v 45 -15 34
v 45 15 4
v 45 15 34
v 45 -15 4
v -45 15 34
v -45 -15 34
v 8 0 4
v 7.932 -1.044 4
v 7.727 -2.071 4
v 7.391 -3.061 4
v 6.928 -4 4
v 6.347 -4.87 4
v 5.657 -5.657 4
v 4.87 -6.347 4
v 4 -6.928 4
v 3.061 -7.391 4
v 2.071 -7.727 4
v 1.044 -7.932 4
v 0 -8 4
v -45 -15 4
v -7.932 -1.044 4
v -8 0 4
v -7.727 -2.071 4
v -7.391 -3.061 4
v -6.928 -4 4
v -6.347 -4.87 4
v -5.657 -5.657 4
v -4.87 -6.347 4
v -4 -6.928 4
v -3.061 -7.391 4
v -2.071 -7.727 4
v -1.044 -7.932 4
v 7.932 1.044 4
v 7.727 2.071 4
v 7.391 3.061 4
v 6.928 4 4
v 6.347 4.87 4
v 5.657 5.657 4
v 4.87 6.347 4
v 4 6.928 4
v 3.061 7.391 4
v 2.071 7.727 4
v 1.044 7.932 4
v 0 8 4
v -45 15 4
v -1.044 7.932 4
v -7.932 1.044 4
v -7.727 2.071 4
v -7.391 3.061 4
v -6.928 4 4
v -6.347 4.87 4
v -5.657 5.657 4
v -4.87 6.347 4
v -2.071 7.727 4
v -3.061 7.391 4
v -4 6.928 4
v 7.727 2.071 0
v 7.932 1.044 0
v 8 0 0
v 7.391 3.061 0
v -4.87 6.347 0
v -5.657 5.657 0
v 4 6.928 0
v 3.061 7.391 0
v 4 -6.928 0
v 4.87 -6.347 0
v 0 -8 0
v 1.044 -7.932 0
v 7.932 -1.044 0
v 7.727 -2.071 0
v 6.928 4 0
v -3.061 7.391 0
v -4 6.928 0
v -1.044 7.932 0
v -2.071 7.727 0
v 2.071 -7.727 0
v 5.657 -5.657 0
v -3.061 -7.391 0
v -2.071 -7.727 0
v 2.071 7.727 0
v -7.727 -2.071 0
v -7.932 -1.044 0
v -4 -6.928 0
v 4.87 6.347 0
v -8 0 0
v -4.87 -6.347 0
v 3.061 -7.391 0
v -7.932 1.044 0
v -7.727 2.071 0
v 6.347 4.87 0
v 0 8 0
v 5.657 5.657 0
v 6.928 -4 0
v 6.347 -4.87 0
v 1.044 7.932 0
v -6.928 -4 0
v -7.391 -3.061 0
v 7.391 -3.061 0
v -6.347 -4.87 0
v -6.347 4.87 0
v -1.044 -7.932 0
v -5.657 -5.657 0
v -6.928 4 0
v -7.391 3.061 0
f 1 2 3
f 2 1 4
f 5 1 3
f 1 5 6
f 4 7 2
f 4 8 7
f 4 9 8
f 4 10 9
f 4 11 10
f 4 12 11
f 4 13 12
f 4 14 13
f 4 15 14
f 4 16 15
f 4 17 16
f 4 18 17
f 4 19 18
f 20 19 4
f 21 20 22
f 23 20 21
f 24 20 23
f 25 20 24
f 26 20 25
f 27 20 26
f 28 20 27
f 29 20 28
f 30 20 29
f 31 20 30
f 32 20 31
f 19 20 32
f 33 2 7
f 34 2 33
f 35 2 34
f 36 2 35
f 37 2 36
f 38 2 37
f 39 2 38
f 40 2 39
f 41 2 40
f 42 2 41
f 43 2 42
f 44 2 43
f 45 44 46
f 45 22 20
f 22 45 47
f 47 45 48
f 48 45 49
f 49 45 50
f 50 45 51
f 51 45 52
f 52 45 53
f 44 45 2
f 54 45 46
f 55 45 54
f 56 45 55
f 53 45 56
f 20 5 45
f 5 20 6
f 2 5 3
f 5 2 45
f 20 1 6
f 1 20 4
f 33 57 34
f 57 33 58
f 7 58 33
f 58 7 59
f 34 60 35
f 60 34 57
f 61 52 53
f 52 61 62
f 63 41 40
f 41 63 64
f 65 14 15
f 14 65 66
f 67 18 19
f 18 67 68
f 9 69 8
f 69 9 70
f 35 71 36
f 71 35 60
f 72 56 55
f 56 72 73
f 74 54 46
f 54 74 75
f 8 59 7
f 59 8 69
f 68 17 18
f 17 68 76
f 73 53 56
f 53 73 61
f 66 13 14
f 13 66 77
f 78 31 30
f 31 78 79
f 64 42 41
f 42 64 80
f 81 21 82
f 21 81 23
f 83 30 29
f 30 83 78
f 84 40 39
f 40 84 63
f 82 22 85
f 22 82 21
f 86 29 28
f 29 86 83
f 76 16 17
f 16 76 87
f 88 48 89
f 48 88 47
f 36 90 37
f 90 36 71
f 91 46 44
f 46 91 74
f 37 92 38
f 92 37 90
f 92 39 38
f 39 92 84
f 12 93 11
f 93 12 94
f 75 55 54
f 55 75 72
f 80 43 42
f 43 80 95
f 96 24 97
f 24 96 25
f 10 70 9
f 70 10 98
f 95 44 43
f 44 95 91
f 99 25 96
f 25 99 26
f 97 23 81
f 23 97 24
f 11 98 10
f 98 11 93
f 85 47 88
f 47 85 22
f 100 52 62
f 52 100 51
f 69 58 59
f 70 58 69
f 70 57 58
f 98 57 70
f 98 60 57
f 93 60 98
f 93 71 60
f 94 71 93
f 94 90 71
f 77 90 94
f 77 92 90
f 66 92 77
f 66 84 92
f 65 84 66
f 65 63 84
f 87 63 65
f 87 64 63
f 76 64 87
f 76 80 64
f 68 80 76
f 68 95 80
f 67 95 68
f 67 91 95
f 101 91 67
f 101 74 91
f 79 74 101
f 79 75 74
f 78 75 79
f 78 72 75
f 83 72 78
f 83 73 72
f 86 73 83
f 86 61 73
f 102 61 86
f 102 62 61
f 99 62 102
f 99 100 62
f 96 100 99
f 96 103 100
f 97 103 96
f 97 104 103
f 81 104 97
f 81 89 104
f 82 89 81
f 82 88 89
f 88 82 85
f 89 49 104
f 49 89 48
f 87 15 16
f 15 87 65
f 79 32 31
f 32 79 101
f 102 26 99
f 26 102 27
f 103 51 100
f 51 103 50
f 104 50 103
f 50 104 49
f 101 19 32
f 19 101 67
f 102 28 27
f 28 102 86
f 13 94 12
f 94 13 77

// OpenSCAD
// file: ../webcam/webcam.scad
// A bare webcam: a body and its lens, nothing to stand it on. Drawn looking
// straight down, as a camera added to a site first stands: the middle of the
// lens's front face is the origin, at z = 0, and the body is above it. Its
// long side runs across the picture it takes (+x); the picture's top is +y.
// A camera in a site is this, tilted from straight down about its long side
// and turned about the vertical (apothecary/vision/cameras.py).

body = [90, 30, 30];   // across the picture, up the picture, lens to back
lens_d = 16;           // the lens's diameter
lens_h = 4;            // how far the lens stands out of the body

module webcam() {
    color("dimgray") translate([-body[0] / 2, -body[1] / 2, lens_h]) cube(body);
    color("black") cylinder(d = lens_d, h = lens_h, $fn = 48);
}

webcam();
// main file
// A stub: a webcam on a desk stand -- a weighted foot and an upright, the
// webcam on a hinge at its top. Only the webcam is drawn for now.

include <../webcam/webcam.scad>
